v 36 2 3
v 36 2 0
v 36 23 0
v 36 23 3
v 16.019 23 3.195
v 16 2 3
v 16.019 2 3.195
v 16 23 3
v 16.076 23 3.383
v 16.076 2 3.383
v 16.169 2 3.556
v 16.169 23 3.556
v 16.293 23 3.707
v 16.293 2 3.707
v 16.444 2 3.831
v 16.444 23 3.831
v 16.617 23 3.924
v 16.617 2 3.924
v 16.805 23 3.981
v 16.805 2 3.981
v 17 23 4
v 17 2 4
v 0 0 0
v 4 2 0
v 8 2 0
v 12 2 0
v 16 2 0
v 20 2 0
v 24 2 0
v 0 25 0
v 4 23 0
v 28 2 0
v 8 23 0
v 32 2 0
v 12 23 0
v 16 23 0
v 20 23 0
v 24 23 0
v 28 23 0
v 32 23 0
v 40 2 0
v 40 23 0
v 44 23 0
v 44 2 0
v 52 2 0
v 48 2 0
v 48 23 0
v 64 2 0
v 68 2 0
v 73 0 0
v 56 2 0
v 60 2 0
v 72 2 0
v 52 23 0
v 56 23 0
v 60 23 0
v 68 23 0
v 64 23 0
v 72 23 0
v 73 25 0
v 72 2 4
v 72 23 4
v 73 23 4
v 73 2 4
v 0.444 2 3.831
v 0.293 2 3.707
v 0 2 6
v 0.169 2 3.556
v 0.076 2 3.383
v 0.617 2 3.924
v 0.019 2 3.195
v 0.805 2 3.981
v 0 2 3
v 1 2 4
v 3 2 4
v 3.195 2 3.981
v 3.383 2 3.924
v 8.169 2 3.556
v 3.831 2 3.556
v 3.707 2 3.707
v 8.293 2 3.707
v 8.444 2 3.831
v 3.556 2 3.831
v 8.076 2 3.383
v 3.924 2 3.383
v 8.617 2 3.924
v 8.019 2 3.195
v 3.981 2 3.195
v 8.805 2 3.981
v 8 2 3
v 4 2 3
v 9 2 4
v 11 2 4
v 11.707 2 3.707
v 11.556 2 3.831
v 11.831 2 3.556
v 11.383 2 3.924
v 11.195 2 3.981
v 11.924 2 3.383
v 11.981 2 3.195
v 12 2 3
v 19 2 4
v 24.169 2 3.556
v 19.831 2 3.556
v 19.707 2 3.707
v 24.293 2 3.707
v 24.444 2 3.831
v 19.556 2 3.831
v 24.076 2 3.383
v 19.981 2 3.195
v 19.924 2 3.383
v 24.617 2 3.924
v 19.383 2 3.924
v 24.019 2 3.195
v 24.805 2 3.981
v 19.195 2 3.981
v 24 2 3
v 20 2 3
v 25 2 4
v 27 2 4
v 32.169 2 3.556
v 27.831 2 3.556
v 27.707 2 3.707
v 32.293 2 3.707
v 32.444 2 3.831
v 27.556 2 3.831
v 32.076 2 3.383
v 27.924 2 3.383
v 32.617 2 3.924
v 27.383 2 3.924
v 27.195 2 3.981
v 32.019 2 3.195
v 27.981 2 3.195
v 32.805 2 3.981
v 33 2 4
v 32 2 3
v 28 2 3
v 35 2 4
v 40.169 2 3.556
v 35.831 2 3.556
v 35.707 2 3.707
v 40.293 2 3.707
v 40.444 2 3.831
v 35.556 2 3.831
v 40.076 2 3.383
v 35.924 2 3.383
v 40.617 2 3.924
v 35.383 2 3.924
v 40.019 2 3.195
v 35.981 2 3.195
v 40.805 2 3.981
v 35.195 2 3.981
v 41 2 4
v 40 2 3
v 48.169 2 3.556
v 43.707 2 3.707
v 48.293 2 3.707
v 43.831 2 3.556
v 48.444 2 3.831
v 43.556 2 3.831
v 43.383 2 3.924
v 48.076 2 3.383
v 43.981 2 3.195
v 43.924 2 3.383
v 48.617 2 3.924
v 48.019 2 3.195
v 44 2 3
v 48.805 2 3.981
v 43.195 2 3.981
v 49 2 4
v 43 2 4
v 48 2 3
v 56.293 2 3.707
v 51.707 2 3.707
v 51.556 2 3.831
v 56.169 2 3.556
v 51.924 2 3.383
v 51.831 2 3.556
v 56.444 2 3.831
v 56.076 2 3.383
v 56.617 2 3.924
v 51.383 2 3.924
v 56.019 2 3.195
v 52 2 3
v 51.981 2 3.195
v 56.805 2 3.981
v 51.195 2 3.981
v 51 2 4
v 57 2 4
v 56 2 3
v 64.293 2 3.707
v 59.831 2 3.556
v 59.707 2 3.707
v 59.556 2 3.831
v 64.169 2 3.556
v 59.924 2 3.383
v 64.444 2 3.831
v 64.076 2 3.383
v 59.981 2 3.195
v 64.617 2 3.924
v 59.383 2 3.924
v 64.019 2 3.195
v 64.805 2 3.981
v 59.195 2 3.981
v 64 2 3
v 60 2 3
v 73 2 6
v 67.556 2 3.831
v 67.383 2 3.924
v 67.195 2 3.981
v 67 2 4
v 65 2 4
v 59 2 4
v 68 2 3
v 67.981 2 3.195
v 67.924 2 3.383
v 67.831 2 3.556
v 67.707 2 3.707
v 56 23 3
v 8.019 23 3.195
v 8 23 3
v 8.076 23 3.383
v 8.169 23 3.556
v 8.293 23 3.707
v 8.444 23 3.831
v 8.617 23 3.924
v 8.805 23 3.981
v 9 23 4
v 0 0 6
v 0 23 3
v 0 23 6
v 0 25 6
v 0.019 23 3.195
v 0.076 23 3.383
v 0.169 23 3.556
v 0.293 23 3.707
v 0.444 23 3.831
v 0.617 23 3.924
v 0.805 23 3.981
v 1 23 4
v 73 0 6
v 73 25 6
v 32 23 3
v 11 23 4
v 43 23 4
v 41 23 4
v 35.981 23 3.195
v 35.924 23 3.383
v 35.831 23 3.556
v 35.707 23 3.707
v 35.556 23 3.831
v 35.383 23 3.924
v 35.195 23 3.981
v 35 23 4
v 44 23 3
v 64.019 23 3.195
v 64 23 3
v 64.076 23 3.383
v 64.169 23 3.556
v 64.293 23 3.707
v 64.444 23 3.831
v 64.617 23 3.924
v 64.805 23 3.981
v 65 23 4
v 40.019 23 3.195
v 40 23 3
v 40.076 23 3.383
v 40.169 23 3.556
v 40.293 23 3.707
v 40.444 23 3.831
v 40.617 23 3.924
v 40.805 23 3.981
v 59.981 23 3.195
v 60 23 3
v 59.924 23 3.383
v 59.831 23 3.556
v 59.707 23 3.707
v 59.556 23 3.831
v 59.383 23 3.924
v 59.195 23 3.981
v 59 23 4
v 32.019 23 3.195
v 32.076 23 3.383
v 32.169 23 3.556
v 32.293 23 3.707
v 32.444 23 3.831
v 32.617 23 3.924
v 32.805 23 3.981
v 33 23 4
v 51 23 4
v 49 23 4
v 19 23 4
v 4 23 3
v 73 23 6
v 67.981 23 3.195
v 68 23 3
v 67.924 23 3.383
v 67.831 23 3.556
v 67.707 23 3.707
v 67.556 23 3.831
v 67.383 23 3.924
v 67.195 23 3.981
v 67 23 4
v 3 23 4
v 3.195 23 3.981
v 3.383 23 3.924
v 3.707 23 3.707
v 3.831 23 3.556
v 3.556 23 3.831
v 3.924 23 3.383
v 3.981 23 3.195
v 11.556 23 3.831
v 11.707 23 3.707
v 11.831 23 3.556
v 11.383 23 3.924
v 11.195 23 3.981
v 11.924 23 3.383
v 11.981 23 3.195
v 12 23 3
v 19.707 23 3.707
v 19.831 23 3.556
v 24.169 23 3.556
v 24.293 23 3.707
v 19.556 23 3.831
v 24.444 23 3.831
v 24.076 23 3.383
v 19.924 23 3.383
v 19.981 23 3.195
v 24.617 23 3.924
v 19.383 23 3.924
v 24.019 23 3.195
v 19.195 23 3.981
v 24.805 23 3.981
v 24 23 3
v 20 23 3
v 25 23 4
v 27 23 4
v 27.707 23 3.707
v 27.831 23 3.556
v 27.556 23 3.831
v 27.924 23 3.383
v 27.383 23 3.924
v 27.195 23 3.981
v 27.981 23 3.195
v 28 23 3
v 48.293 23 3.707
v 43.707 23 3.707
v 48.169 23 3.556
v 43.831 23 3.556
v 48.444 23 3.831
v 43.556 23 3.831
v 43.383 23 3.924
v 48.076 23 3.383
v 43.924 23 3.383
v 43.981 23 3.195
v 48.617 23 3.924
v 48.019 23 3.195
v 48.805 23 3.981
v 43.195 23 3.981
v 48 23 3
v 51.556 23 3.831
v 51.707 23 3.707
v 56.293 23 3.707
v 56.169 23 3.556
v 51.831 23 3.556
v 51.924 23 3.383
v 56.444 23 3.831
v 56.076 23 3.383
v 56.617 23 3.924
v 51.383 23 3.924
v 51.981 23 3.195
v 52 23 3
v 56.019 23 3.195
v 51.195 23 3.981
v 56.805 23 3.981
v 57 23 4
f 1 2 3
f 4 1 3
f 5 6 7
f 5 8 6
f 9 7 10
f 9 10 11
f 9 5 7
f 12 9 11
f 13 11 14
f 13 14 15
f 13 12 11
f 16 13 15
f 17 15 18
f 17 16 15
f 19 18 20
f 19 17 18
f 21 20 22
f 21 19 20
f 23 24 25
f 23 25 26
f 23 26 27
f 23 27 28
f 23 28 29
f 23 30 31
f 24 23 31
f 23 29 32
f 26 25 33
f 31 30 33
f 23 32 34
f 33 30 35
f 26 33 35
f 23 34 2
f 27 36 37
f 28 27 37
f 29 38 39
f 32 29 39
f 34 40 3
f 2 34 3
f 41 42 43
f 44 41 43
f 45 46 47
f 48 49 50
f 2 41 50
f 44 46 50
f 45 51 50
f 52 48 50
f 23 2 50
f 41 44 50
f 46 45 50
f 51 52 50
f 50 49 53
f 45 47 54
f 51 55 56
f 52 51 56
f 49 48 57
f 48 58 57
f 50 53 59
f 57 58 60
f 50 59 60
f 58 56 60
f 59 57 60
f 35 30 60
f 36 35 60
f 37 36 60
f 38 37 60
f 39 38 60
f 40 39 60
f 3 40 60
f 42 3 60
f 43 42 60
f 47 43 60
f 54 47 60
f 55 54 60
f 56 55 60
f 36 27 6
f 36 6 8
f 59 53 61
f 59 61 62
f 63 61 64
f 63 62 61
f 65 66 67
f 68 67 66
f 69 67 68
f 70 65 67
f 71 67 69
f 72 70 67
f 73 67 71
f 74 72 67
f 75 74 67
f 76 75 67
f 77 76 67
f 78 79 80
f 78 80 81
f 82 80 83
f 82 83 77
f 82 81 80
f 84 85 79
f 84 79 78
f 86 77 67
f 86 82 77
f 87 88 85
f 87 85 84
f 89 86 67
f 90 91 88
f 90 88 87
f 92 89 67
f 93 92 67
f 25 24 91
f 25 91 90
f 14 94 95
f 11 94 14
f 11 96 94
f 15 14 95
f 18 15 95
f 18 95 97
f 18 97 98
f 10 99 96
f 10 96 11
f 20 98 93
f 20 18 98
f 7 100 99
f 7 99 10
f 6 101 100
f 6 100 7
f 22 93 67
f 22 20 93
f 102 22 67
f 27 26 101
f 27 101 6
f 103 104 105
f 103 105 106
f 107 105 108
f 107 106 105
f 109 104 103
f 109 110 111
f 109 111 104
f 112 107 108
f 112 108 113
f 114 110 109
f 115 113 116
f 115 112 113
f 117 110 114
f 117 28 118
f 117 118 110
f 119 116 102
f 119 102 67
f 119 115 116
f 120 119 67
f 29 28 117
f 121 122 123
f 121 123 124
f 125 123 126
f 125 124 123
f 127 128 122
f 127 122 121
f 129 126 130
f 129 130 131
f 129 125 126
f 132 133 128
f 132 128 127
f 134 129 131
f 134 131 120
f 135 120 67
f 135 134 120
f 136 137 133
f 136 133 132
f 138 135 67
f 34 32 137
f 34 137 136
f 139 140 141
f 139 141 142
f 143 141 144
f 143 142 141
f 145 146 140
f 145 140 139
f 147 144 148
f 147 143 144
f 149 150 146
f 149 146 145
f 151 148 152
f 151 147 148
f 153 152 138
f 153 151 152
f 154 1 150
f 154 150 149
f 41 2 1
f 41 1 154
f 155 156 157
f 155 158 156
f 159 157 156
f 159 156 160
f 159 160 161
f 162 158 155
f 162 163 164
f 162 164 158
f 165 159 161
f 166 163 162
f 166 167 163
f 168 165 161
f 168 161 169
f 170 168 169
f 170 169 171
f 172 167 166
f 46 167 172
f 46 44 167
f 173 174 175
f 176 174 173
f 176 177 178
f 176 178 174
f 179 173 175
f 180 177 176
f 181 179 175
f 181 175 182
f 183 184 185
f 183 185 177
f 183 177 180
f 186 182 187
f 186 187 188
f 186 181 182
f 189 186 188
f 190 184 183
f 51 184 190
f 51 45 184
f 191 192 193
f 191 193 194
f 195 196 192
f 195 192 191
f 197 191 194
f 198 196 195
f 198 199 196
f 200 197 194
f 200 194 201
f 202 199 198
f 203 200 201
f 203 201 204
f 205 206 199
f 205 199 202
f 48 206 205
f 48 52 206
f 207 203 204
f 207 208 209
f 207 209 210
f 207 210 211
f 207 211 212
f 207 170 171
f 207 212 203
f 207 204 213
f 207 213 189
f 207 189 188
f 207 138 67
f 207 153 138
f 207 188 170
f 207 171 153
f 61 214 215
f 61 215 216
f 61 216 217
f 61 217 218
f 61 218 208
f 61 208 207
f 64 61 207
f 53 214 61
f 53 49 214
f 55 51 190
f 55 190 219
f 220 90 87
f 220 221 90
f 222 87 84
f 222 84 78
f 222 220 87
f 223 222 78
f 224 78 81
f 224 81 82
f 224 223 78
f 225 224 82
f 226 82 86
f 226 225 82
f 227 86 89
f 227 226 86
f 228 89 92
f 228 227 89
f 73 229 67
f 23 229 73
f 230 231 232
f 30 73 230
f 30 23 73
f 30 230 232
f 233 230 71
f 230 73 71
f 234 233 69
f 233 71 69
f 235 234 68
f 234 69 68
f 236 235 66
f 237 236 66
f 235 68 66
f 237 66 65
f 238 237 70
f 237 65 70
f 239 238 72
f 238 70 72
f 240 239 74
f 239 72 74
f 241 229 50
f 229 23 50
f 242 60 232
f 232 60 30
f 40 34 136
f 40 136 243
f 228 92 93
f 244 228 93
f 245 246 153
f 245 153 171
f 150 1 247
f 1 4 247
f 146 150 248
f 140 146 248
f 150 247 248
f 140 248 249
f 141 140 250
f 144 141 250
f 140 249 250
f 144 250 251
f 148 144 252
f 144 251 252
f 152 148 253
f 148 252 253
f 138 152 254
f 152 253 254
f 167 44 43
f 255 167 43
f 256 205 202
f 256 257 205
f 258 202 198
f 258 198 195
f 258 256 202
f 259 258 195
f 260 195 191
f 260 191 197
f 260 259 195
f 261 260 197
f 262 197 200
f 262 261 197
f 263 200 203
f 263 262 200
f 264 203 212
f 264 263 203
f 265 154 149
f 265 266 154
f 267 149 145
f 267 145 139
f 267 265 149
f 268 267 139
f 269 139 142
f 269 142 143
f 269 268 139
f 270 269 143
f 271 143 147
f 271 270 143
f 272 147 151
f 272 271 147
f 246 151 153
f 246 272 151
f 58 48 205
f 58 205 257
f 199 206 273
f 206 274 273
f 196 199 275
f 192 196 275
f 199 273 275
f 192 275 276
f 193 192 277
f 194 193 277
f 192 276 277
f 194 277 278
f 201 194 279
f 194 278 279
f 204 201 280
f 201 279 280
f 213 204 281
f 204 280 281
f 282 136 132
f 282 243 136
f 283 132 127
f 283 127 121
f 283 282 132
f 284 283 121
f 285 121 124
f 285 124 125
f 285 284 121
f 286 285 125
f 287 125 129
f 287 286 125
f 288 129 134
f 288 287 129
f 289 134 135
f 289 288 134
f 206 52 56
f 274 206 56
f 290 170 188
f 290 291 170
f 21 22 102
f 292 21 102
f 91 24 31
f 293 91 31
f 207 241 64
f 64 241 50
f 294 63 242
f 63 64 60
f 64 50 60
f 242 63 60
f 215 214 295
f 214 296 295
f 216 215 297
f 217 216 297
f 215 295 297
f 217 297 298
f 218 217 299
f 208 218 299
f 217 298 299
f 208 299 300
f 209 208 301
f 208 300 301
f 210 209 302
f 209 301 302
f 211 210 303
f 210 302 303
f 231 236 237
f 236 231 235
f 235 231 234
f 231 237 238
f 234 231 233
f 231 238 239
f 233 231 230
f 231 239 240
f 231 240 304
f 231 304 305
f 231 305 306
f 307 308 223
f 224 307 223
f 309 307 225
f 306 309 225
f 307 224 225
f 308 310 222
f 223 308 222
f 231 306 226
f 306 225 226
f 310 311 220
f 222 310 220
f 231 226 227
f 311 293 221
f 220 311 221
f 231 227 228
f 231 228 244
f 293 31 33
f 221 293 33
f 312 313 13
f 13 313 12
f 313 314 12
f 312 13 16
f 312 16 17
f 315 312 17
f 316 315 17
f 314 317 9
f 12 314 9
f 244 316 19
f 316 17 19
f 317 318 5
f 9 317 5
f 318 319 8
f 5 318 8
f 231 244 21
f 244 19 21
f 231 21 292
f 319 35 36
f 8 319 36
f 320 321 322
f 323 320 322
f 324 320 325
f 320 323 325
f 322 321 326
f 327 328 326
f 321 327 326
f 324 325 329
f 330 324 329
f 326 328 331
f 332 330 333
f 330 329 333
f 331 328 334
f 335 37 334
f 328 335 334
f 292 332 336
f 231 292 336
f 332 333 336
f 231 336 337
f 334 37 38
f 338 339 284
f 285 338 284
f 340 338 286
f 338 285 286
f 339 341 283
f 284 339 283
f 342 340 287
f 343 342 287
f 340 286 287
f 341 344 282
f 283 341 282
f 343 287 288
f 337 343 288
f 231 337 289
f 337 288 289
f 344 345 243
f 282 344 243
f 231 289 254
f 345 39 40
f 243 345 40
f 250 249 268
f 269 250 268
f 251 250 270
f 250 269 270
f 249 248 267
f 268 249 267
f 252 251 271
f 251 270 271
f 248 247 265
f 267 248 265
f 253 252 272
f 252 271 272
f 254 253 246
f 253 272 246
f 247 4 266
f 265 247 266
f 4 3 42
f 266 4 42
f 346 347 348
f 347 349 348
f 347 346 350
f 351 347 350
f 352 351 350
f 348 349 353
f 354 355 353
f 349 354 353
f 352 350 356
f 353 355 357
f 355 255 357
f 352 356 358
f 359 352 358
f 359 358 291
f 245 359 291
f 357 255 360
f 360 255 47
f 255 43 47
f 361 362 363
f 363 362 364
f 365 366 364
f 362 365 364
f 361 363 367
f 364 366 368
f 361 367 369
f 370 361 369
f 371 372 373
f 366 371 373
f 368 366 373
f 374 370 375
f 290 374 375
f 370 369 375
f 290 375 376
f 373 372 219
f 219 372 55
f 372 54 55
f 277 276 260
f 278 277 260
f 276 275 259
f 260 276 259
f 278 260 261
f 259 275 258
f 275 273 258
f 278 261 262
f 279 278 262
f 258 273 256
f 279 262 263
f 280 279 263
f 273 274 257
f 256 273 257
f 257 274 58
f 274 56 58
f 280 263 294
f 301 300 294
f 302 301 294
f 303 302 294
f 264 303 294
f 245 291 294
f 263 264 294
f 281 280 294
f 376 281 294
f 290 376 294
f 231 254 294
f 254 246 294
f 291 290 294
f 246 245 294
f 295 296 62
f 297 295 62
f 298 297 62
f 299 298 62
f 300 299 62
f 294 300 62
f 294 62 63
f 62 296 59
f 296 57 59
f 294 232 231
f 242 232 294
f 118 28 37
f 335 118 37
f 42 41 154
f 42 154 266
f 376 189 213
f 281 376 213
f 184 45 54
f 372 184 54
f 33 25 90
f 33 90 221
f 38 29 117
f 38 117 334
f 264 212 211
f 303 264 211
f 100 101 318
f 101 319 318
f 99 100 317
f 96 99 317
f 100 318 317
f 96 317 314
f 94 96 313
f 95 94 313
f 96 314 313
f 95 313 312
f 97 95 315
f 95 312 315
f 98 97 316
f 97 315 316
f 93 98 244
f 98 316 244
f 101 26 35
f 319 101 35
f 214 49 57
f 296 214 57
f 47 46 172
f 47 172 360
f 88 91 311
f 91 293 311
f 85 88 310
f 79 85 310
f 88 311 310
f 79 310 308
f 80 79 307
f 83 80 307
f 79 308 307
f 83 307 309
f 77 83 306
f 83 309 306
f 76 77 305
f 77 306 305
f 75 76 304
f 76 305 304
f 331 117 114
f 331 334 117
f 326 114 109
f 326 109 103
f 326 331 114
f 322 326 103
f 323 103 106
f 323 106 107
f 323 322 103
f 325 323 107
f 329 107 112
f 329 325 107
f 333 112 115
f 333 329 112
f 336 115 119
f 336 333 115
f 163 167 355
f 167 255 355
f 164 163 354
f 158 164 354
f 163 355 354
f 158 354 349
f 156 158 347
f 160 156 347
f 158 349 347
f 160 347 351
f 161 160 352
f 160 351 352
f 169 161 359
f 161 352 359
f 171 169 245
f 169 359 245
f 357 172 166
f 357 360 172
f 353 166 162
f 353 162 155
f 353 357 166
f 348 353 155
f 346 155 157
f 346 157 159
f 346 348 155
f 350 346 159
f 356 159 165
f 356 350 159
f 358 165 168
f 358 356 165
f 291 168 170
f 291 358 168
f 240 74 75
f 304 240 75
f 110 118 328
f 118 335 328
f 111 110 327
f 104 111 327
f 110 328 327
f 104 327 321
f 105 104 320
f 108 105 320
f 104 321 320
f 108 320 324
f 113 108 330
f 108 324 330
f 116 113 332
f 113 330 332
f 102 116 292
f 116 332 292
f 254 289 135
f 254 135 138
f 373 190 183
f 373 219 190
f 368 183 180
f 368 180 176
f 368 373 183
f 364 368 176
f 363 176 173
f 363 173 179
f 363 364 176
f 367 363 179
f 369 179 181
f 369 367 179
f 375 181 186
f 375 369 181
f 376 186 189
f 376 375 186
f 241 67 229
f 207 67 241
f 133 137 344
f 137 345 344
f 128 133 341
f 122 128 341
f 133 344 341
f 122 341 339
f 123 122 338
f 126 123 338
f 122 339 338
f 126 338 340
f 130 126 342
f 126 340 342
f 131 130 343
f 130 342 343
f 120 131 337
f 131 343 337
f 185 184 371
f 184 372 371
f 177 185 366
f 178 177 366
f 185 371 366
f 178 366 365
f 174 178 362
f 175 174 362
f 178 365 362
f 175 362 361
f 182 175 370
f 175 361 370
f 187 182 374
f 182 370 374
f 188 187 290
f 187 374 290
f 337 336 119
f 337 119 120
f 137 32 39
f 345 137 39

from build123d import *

# Parameters (mm, degrees)
F0_W     = 4
F0_H     = 21
F1_DEPTH = 4
F2_R     = 1
F3_W     = 73
F3_H     = 2
F4_DEPTH = 2
F5_R     = 1


with BuildPart() as f1:
    # F0 (on Top) → F1 (new body)
    with BuildSketch(Plane.XY):
        Polygon((0, 25), (0, 0), (73, 0), (73, 25), (68, 25), align=None)
        with Locations((6, 12.5)):
            Rectangle(F0_W, F0_H, mode=Mode.SUBTRACT)
        with Locations((14, 12.5)):
            Rectangle(F0_W, F0_H, mode=Mode.SUBTRACT)
        with Locations((22, 12.5)):
            Rectangle(F0_W, F0_H, mode=Mode.SUBTRACT)
        with Locations((30, 12.5)):
            Rectangle(F0_W, F0_H, mode=Mode.SUBTRACT)
        with Locations((38, 12.5)):
            Rectangle(F0_W, F0_H, mode=Mode.SUBTRACT)
        with Locations((46, 12.5)):
            Rectangle(F0_W, F0_H, mode=Mode.SUBTRACT)
        with Locations((54, 12.5)):
            Rectangle(F0_W, F0_H, mode=Mode.SUBTRACT)
        with Locations((62, 12.5)):
            Rectangle(F0_W, F0_H, mode=Mode.SUBTRACT)
        with Locations((70, 12.5)):
            Rectangle(F0_W, F0_H, mode=Mode.SUBTRACT)
    extrude(amount=F1_DEPTH)

    # F2
    f2_edges = [f1.edges().sort_by_distance(p)[0] for p in [
        (8, 12.5, 4),
        (12, 12.5, 4),
        (16, 12.5, 4),
        (20, 12.5, 4),
        (24, 12.5, 4),
        (28, 12.5, 4),
        (32, 12.5, 4),
        (36, 12.5, 4),
        (40, 12.5, 4),
        (44, 12.5, 4),
        (48, 12.5, 4),
        (52, 12.5, 4),
        (56, 12.5, 4),
        (60, 12.5, 4),
        (64, 12.5, 4),
        (68, 12.5, 4),
    ]]
    fillet(f2_edges, radius=F2_R)

    # F3 (on face) → F4 (join)
    with BuildSketch(Plane.XY.offset(4)):
        with Locations((36.5, 1)):
            Rectangle(F3_W, F3_H)
        with Locations((36.5, 24)):
            Rectangle(F3_W, F3_H)
    extrude(amount=F4_DEPTH)

    # F5
    f5_edges = [f1.edges().sort_by_distance(p)[0] for p in [
        (4, 12.5, 4),
        (0, 12.5, 4),
    ]]
    fillet(f5_edges, radius=F5_R)


solid = f1.part
